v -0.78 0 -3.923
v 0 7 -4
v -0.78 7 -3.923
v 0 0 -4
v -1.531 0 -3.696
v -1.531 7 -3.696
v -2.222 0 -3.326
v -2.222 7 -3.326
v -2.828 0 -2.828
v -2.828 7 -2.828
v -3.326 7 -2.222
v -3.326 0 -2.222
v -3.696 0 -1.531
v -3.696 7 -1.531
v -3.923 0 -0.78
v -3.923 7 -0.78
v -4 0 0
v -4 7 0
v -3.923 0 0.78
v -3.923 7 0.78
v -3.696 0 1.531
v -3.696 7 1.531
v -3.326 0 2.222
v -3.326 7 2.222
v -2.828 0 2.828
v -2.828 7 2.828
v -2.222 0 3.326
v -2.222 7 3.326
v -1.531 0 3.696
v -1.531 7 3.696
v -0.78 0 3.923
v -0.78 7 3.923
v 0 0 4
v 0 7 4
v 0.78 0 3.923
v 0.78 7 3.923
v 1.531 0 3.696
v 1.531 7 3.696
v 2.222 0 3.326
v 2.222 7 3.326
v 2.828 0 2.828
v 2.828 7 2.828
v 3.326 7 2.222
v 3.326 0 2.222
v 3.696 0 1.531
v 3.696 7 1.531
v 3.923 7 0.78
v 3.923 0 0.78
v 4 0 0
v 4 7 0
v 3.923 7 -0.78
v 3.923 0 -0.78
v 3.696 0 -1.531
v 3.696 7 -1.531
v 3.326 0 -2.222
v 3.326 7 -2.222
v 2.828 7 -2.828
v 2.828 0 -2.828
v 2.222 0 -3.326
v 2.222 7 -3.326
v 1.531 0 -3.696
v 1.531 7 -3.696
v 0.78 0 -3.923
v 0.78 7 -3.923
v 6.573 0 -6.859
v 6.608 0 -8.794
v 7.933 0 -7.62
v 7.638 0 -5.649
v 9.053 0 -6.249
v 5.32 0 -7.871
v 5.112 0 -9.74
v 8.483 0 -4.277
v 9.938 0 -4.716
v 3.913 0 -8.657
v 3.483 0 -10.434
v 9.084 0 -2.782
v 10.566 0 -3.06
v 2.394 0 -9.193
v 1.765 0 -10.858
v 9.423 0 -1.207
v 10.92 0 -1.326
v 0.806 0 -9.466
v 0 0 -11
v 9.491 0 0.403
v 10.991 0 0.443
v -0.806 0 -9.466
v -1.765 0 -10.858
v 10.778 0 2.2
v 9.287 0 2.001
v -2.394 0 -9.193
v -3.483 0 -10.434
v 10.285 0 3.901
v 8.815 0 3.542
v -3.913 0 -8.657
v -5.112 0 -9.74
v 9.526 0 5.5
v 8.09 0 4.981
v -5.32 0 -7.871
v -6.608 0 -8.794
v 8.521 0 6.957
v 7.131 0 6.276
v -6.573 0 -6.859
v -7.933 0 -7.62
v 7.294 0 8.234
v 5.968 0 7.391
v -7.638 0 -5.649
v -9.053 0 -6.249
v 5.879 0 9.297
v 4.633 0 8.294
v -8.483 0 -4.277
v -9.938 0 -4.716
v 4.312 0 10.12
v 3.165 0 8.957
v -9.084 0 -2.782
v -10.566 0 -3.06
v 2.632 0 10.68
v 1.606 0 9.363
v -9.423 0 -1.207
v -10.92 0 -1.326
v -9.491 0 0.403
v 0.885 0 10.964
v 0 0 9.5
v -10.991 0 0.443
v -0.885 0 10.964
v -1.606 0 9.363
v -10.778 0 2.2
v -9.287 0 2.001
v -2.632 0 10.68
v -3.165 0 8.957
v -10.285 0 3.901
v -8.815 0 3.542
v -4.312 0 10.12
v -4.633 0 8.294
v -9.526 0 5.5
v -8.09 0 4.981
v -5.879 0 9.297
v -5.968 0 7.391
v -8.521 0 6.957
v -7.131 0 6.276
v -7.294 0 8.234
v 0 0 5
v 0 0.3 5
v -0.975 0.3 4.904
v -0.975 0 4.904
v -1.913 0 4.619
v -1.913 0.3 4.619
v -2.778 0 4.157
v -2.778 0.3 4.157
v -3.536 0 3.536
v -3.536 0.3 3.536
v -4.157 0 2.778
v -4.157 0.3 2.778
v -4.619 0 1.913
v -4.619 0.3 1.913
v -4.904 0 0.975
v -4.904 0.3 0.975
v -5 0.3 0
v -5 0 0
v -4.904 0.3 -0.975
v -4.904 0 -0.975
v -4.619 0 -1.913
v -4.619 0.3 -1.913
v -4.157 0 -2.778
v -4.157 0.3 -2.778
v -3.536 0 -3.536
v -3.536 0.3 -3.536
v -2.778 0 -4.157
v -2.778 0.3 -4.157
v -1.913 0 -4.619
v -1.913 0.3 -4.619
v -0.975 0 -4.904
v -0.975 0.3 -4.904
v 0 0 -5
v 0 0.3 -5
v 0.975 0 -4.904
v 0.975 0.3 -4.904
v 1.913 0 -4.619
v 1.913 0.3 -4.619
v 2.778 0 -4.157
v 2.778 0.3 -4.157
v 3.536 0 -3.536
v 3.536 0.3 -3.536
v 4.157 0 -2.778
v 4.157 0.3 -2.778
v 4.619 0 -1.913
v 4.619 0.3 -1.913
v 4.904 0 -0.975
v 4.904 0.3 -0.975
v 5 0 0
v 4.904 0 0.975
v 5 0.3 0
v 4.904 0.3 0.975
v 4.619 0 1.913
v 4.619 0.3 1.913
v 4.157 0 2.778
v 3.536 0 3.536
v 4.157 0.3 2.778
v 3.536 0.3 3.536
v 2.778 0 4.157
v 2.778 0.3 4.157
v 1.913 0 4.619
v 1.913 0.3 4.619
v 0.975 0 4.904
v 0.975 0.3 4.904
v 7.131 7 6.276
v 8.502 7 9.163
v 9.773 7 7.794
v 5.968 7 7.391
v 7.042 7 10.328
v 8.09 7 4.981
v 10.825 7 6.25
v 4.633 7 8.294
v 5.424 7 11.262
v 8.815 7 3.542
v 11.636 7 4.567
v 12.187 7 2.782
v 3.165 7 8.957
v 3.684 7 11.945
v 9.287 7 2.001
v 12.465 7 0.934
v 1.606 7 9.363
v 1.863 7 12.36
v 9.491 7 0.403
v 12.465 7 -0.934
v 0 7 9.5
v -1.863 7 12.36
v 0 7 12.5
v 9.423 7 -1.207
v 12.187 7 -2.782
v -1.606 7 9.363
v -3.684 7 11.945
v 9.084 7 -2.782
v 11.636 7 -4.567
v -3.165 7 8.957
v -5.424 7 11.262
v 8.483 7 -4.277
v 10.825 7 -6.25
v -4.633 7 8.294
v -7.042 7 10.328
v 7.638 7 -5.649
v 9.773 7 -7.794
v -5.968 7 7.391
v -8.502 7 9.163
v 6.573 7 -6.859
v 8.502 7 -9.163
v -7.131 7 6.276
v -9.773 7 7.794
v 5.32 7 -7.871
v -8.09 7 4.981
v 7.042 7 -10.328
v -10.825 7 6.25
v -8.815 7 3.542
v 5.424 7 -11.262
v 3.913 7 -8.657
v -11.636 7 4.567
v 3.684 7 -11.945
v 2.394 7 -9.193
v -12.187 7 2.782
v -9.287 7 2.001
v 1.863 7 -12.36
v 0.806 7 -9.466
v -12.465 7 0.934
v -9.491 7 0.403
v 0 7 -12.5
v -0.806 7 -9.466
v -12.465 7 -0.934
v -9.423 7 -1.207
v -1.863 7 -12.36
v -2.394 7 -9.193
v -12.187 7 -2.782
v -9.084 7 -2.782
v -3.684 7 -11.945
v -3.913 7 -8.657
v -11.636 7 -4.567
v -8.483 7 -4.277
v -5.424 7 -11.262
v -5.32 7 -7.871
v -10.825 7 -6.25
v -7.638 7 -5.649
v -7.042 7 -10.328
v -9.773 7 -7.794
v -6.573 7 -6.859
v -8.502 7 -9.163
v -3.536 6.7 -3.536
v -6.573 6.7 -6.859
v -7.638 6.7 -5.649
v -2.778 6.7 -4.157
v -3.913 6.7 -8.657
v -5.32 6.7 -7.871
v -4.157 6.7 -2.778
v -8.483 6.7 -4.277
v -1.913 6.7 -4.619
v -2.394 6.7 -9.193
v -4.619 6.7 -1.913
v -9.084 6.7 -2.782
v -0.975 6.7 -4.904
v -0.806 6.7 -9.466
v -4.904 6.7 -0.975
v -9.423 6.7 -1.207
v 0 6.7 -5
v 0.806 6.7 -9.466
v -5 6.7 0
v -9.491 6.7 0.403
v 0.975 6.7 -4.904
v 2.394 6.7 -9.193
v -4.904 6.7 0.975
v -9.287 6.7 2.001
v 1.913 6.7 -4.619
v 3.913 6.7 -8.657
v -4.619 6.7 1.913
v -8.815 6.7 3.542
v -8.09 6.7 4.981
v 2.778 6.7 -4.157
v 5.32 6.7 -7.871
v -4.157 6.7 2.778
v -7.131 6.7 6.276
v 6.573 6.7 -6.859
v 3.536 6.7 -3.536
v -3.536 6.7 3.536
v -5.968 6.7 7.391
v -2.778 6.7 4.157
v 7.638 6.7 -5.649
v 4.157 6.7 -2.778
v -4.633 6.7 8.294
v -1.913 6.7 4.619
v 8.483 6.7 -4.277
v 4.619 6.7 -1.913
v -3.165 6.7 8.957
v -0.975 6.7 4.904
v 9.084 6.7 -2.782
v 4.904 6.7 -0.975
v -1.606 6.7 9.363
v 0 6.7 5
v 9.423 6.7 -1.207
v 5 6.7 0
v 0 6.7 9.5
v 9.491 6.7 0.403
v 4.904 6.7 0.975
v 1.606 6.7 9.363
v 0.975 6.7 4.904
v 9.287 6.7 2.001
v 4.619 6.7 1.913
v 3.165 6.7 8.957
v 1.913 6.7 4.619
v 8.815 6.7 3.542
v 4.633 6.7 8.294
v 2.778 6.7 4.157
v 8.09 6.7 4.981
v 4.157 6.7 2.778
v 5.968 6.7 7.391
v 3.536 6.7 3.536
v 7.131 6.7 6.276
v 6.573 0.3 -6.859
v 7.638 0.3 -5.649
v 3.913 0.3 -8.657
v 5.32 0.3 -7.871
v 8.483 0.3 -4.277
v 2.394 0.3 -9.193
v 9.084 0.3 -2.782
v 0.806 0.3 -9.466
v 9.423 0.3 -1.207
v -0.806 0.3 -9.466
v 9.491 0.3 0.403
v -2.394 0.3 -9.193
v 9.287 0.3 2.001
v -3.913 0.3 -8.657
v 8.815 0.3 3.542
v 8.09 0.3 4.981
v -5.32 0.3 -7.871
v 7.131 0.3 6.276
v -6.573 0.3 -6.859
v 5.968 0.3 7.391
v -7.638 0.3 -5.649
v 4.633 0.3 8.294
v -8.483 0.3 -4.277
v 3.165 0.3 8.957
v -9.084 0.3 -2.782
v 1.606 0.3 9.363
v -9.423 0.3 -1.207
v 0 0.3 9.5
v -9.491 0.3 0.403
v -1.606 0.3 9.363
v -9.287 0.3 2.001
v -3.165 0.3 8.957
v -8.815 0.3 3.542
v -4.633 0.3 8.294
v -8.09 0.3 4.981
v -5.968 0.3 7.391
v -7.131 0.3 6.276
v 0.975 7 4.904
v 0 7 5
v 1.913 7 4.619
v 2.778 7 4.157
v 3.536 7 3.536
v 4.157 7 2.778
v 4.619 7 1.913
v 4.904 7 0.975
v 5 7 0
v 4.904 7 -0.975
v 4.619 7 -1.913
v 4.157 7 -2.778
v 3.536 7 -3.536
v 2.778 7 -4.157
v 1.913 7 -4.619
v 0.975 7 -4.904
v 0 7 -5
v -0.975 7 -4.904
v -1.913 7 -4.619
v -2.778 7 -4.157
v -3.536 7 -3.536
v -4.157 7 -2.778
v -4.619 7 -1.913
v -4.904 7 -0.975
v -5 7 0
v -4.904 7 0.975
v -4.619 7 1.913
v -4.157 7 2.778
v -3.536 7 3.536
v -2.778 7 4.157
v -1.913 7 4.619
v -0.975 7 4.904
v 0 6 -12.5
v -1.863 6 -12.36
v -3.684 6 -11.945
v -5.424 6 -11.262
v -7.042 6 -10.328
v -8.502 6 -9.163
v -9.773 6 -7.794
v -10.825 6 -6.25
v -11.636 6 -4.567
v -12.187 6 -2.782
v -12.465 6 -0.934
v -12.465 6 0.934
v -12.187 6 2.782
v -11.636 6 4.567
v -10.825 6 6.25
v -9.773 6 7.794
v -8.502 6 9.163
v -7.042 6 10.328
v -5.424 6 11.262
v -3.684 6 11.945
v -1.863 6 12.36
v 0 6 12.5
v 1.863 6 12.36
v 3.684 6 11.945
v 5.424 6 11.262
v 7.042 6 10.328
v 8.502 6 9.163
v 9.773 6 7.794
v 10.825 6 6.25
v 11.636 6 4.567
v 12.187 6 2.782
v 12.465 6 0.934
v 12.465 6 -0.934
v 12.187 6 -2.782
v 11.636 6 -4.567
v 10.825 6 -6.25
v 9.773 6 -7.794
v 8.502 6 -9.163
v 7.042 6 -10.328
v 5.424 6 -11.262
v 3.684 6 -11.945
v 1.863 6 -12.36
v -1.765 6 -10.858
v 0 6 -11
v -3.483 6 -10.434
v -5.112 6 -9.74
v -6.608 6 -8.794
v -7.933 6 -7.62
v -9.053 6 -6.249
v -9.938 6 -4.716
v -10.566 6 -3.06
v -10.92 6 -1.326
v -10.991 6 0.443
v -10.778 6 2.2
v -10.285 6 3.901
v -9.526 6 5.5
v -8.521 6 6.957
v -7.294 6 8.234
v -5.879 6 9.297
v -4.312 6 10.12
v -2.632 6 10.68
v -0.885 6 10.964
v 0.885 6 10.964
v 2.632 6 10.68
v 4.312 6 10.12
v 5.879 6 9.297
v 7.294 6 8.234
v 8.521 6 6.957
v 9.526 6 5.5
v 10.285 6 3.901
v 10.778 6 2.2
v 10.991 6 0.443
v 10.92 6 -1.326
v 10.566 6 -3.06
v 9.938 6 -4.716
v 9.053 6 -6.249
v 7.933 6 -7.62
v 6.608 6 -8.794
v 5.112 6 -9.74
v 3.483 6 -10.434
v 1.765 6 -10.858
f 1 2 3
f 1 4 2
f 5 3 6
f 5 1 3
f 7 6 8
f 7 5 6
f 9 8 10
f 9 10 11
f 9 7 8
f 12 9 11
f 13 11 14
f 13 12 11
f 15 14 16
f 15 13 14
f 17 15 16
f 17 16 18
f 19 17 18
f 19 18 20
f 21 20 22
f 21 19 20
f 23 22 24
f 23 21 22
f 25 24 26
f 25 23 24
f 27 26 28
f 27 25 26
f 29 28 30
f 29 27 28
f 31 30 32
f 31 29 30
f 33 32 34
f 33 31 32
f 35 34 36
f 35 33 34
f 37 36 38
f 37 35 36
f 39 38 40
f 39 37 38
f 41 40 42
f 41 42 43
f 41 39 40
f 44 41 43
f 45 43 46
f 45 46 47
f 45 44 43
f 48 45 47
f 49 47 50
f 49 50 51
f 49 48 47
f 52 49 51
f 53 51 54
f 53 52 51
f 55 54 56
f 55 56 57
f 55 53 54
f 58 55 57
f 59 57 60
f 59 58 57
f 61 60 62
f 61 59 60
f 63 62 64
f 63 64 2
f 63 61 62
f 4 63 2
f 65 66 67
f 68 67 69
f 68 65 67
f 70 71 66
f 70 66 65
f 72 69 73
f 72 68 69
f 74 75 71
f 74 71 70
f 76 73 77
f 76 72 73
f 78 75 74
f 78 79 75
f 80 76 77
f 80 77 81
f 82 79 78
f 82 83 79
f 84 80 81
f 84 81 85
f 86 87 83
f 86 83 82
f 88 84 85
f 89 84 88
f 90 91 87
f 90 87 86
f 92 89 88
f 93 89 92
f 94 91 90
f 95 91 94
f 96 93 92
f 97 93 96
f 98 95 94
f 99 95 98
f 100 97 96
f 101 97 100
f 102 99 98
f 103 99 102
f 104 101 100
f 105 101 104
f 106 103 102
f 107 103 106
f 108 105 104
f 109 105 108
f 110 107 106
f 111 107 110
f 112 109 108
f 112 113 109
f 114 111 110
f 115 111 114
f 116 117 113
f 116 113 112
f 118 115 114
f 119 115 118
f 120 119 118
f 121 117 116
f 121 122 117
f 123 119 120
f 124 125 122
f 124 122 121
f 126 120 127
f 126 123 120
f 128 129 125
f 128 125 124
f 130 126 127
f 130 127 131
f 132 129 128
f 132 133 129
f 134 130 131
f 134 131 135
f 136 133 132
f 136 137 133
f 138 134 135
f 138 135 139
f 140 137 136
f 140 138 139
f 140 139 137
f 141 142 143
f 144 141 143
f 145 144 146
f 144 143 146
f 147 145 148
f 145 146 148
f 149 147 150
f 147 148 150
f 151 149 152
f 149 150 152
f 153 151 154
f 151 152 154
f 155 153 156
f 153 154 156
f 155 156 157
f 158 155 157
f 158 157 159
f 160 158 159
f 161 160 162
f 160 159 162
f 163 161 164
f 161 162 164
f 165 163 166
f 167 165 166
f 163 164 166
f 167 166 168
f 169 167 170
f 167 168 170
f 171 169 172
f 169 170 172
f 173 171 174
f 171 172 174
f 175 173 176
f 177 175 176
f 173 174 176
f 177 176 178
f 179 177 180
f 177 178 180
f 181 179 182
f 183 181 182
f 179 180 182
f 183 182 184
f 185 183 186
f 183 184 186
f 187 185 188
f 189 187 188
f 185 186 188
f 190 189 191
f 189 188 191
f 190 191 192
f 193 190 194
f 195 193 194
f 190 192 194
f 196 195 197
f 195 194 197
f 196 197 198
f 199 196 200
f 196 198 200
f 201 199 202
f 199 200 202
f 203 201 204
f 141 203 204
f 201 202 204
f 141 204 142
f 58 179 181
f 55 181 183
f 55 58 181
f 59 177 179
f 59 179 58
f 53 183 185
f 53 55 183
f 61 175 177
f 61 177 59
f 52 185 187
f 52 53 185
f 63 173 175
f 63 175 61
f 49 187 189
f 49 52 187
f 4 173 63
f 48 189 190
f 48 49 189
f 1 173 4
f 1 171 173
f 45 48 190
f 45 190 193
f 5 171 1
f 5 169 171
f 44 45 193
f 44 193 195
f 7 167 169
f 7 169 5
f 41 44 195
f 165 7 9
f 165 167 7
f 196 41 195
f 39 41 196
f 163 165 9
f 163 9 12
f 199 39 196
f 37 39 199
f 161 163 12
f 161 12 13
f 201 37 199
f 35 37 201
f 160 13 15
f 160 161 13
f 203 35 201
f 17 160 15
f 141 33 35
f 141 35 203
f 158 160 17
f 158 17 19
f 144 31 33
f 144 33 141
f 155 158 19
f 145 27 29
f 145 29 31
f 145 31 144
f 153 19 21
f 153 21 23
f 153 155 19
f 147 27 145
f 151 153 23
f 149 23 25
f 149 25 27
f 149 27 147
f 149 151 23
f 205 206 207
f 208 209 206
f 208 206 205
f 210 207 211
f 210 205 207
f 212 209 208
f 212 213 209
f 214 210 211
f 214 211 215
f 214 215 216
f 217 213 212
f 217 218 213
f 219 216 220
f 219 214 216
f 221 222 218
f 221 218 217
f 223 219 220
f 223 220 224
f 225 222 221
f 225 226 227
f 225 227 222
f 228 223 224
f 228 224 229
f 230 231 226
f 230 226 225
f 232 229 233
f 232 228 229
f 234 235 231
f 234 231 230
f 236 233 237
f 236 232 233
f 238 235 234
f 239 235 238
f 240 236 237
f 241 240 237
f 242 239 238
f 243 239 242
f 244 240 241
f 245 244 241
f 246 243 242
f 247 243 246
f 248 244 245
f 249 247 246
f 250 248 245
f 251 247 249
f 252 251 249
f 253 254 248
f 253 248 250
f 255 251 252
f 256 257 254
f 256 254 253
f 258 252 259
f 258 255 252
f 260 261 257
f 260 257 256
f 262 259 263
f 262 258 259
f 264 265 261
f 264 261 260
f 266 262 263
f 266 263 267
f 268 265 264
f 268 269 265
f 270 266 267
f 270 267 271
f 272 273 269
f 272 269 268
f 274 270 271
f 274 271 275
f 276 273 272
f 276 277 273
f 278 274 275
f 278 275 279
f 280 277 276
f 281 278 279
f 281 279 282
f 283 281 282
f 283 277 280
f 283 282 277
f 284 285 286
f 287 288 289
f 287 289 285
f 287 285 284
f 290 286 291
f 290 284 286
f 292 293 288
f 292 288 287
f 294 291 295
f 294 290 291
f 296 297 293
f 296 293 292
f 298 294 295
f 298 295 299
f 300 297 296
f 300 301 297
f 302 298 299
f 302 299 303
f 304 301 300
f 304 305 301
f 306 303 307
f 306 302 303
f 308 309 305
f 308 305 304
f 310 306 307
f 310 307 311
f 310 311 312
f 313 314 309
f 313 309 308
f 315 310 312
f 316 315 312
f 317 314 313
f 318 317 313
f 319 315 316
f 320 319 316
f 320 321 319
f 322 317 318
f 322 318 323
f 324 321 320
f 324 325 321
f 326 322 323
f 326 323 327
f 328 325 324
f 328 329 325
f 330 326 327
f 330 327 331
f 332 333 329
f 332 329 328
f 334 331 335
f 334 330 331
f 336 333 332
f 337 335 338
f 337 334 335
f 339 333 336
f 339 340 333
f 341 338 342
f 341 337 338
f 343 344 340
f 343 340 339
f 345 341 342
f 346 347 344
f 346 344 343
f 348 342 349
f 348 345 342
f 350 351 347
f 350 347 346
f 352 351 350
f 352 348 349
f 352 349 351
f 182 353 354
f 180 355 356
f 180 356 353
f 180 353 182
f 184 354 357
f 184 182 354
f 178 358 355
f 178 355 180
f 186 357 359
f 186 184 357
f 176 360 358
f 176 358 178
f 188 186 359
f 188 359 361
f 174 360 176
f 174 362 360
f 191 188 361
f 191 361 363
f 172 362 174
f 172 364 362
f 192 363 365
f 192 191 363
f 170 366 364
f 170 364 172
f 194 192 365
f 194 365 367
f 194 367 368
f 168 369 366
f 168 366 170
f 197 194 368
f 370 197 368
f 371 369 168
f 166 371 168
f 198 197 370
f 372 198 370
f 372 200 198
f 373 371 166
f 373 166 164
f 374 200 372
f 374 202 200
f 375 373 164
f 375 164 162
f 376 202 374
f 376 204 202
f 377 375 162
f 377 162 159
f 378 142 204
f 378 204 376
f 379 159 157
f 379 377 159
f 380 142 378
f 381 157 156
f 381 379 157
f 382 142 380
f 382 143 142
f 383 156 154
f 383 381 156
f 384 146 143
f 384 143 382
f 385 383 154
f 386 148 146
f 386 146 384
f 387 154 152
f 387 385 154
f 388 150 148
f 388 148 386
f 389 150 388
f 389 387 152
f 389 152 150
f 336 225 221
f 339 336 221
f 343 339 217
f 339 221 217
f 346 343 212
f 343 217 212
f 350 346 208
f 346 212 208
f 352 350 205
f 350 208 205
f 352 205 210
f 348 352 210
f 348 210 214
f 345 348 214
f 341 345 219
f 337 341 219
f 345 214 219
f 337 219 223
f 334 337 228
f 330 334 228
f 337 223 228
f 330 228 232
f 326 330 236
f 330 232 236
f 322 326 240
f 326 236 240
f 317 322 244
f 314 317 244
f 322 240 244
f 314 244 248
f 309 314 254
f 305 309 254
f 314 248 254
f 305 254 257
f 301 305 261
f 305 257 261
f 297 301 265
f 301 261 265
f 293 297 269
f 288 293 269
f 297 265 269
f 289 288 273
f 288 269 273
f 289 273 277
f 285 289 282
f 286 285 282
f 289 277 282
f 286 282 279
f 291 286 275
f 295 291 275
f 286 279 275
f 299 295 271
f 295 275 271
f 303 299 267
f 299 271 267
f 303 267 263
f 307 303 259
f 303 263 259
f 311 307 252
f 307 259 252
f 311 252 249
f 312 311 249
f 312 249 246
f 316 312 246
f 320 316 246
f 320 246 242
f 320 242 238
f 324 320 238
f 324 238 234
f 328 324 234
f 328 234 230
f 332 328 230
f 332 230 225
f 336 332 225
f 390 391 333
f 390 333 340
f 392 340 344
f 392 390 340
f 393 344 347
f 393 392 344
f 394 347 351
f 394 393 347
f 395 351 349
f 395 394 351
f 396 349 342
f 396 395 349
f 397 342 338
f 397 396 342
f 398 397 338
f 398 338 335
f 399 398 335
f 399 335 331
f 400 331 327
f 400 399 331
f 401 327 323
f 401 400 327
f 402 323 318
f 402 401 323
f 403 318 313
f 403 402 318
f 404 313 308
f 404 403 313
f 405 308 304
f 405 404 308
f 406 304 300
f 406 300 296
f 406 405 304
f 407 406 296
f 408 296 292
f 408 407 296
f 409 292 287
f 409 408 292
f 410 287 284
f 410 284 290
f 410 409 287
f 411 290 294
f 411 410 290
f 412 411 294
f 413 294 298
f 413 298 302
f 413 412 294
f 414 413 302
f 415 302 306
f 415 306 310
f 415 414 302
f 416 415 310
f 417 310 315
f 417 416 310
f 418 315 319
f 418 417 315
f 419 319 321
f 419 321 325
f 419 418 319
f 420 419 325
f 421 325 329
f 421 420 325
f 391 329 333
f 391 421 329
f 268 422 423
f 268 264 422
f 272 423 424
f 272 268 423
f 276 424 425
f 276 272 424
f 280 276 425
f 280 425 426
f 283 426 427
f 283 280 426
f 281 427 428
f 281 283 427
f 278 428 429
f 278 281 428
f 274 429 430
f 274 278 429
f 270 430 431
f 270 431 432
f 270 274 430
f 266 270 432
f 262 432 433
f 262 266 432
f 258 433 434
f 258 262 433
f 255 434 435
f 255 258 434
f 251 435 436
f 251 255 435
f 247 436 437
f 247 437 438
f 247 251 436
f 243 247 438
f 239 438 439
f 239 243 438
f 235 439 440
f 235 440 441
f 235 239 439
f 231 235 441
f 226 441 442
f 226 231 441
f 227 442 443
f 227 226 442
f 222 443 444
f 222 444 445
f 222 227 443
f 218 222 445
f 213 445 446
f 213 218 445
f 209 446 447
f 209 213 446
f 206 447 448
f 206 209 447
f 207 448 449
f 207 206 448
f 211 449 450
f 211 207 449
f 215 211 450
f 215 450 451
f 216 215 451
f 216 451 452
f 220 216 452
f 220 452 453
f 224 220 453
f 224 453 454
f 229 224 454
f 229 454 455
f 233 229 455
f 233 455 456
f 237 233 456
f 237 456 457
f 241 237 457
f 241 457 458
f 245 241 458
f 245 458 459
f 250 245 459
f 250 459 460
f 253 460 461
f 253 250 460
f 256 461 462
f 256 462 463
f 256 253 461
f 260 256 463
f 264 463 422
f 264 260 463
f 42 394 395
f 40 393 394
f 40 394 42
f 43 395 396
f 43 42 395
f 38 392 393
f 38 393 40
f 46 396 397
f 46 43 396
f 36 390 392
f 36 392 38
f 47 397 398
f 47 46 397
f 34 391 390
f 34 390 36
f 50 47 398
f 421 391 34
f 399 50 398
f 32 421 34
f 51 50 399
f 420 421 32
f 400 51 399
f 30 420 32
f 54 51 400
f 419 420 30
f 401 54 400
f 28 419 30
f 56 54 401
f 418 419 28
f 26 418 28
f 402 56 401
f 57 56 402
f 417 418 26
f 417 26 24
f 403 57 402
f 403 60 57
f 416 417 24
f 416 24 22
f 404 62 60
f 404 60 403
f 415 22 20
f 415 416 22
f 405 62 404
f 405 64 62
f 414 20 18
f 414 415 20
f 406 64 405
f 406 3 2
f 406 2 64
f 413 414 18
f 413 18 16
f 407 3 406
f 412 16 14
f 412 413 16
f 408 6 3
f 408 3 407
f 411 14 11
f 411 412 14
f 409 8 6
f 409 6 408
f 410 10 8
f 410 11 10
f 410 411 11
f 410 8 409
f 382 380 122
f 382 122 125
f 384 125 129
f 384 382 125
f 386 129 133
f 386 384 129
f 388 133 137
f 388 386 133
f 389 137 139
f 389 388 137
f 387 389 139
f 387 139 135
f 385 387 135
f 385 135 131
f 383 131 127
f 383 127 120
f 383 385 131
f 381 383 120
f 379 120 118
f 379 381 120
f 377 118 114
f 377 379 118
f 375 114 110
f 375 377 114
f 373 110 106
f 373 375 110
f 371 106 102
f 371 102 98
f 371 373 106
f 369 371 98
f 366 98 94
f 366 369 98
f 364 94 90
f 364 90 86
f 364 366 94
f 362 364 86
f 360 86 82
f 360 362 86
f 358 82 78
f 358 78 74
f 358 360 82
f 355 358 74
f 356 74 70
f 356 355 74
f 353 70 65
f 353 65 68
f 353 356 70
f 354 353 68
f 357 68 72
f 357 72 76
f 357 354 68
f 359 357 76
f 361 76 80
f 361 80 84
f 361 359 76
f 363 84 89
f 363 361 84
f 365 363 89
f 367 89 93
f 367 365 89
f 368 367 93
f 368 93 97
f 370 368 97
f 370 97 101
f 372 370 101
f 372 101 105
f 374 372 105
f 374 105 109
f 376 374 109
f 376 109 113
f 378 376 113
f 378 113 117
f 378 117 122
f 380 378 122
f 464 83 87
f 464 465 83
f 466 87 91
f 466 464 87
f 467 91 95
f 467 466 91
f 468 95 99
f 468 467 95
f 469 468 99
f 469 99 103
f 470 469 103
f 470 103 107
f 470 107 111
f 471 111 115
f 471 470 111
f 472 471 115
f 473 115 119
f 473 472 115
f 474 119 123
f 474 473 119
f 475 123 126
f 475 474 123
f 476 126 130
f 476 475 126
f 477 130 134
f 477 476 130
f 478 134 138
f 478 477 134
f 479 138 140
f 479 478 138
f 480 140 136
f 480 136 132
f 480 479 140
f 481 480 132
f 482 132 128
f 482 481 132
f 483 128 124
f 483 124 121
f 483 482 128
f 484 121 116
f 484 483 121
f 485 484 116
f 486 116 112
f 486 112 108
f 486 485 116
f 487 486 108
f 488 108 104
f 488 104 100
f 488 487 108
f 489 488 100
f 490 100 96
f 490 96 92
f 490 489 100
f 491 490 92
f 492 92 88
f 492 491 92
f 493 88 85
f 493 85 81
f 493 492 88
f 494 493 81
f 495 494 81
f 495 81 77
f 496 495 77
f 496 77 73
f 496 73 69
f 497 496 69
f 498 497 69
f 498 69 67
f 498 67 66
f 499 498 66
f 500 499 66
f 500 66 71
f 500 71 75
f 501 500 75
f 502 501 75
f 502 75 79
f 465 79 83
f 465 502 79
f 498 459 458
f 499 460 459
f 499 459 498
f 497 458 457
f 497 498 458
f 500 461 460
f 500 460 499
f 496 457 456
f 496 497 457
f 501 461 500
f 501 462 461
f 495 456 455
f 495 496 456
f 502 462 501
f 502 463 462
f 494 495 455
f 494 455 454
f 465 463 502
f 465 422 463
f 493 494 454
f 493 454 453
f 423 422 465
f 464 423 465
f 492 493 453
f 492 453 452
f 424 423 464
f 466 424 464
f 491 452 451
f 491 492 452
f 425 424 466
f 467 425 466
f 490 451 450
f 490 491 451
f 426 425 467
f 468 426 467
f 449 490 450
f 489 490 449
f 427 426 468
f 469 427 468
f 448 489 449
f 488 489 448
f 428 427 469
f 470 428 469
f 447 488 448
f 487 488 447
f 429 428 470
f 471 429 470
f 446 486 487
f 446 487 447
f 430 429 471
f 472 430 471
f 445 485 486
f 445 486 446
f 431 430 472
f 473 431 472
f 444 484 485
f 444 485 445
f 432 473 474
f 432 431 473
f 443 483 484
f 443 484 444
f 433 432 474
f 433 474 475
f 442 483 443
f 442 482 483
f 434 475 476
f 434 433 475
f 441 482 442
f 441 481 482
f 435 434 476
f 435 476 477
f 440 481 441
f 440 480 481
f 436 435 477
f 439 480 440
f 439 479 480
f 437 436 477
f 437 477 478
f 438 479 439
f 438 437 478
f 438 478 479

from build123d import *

# Parameters (mm, degrees)
SKETCH2_R          = 9.5
SKETCH2_R_2        = 5
CUT_EXTRUDE1_DEPTH = 0.3
CUT_EXTRUDE2_START = -0.3
SKETCH3_R          = 9.5
SKETCH3_R_2        = 5
CUT_EXTRUDE2_DEPTH = 0.3


with BuildPart() as part:
    # Sketch1 → Revolve1 (revolve)
    with BuildSketch(Plane.XY, mode=Mode.PRIVATE) as revolve1_sk:
        Polygon((-12.5, 7), (-4, 7), (-4, 0), (-11, 0), (-11, 6), (-12.5, 6), align=None)
    revolve(revolve1_sk.sketch.rotate(Axis((0, 0, 0), (0, 1, 0)), 270), axis=Axis((0, 0, 0), (0, 1, 0)))

    # Sketch2 → Cut-Extrude1 (cut)
    with BuildSketch(Plane(origin=(0, 7, 0), x_dir=(1, 0, 0), z_dir=(0, 1, 0))):
        with Locations(Location((0, 0, 0), (0, 0, 270))):
            Circle(SKETCH2_R)
        with Locations(Location((0, 0, 0), (0, 0, 270))):
            Circle(SKETCH2_R_2, mode=Mode.SUBTRACT)
    extrude(amount=-CUT_EXTRUDE1_DEPTH, mode=Mode.SUBTRACT)

    # Sketch3 → Cut-Extrude2 (cut)
    with BuildSketch(Plane.XZ.offset(CUT_EXTRUDE2_START)):
        with Locations(Location((0, 0, 0), (0, 0, 90))):
            Circle(SKETCH3_R)
        with Locations(Location((0, 0, 0), (0, 0, 90))):
            Circle(SKETCH3_R_2, mode=Mode.SUBTRACT)
    extrude(amount=CUT_EXTRUDE2_DEPTH, mode=Mode.SUBTRACT)


solid = part.part
